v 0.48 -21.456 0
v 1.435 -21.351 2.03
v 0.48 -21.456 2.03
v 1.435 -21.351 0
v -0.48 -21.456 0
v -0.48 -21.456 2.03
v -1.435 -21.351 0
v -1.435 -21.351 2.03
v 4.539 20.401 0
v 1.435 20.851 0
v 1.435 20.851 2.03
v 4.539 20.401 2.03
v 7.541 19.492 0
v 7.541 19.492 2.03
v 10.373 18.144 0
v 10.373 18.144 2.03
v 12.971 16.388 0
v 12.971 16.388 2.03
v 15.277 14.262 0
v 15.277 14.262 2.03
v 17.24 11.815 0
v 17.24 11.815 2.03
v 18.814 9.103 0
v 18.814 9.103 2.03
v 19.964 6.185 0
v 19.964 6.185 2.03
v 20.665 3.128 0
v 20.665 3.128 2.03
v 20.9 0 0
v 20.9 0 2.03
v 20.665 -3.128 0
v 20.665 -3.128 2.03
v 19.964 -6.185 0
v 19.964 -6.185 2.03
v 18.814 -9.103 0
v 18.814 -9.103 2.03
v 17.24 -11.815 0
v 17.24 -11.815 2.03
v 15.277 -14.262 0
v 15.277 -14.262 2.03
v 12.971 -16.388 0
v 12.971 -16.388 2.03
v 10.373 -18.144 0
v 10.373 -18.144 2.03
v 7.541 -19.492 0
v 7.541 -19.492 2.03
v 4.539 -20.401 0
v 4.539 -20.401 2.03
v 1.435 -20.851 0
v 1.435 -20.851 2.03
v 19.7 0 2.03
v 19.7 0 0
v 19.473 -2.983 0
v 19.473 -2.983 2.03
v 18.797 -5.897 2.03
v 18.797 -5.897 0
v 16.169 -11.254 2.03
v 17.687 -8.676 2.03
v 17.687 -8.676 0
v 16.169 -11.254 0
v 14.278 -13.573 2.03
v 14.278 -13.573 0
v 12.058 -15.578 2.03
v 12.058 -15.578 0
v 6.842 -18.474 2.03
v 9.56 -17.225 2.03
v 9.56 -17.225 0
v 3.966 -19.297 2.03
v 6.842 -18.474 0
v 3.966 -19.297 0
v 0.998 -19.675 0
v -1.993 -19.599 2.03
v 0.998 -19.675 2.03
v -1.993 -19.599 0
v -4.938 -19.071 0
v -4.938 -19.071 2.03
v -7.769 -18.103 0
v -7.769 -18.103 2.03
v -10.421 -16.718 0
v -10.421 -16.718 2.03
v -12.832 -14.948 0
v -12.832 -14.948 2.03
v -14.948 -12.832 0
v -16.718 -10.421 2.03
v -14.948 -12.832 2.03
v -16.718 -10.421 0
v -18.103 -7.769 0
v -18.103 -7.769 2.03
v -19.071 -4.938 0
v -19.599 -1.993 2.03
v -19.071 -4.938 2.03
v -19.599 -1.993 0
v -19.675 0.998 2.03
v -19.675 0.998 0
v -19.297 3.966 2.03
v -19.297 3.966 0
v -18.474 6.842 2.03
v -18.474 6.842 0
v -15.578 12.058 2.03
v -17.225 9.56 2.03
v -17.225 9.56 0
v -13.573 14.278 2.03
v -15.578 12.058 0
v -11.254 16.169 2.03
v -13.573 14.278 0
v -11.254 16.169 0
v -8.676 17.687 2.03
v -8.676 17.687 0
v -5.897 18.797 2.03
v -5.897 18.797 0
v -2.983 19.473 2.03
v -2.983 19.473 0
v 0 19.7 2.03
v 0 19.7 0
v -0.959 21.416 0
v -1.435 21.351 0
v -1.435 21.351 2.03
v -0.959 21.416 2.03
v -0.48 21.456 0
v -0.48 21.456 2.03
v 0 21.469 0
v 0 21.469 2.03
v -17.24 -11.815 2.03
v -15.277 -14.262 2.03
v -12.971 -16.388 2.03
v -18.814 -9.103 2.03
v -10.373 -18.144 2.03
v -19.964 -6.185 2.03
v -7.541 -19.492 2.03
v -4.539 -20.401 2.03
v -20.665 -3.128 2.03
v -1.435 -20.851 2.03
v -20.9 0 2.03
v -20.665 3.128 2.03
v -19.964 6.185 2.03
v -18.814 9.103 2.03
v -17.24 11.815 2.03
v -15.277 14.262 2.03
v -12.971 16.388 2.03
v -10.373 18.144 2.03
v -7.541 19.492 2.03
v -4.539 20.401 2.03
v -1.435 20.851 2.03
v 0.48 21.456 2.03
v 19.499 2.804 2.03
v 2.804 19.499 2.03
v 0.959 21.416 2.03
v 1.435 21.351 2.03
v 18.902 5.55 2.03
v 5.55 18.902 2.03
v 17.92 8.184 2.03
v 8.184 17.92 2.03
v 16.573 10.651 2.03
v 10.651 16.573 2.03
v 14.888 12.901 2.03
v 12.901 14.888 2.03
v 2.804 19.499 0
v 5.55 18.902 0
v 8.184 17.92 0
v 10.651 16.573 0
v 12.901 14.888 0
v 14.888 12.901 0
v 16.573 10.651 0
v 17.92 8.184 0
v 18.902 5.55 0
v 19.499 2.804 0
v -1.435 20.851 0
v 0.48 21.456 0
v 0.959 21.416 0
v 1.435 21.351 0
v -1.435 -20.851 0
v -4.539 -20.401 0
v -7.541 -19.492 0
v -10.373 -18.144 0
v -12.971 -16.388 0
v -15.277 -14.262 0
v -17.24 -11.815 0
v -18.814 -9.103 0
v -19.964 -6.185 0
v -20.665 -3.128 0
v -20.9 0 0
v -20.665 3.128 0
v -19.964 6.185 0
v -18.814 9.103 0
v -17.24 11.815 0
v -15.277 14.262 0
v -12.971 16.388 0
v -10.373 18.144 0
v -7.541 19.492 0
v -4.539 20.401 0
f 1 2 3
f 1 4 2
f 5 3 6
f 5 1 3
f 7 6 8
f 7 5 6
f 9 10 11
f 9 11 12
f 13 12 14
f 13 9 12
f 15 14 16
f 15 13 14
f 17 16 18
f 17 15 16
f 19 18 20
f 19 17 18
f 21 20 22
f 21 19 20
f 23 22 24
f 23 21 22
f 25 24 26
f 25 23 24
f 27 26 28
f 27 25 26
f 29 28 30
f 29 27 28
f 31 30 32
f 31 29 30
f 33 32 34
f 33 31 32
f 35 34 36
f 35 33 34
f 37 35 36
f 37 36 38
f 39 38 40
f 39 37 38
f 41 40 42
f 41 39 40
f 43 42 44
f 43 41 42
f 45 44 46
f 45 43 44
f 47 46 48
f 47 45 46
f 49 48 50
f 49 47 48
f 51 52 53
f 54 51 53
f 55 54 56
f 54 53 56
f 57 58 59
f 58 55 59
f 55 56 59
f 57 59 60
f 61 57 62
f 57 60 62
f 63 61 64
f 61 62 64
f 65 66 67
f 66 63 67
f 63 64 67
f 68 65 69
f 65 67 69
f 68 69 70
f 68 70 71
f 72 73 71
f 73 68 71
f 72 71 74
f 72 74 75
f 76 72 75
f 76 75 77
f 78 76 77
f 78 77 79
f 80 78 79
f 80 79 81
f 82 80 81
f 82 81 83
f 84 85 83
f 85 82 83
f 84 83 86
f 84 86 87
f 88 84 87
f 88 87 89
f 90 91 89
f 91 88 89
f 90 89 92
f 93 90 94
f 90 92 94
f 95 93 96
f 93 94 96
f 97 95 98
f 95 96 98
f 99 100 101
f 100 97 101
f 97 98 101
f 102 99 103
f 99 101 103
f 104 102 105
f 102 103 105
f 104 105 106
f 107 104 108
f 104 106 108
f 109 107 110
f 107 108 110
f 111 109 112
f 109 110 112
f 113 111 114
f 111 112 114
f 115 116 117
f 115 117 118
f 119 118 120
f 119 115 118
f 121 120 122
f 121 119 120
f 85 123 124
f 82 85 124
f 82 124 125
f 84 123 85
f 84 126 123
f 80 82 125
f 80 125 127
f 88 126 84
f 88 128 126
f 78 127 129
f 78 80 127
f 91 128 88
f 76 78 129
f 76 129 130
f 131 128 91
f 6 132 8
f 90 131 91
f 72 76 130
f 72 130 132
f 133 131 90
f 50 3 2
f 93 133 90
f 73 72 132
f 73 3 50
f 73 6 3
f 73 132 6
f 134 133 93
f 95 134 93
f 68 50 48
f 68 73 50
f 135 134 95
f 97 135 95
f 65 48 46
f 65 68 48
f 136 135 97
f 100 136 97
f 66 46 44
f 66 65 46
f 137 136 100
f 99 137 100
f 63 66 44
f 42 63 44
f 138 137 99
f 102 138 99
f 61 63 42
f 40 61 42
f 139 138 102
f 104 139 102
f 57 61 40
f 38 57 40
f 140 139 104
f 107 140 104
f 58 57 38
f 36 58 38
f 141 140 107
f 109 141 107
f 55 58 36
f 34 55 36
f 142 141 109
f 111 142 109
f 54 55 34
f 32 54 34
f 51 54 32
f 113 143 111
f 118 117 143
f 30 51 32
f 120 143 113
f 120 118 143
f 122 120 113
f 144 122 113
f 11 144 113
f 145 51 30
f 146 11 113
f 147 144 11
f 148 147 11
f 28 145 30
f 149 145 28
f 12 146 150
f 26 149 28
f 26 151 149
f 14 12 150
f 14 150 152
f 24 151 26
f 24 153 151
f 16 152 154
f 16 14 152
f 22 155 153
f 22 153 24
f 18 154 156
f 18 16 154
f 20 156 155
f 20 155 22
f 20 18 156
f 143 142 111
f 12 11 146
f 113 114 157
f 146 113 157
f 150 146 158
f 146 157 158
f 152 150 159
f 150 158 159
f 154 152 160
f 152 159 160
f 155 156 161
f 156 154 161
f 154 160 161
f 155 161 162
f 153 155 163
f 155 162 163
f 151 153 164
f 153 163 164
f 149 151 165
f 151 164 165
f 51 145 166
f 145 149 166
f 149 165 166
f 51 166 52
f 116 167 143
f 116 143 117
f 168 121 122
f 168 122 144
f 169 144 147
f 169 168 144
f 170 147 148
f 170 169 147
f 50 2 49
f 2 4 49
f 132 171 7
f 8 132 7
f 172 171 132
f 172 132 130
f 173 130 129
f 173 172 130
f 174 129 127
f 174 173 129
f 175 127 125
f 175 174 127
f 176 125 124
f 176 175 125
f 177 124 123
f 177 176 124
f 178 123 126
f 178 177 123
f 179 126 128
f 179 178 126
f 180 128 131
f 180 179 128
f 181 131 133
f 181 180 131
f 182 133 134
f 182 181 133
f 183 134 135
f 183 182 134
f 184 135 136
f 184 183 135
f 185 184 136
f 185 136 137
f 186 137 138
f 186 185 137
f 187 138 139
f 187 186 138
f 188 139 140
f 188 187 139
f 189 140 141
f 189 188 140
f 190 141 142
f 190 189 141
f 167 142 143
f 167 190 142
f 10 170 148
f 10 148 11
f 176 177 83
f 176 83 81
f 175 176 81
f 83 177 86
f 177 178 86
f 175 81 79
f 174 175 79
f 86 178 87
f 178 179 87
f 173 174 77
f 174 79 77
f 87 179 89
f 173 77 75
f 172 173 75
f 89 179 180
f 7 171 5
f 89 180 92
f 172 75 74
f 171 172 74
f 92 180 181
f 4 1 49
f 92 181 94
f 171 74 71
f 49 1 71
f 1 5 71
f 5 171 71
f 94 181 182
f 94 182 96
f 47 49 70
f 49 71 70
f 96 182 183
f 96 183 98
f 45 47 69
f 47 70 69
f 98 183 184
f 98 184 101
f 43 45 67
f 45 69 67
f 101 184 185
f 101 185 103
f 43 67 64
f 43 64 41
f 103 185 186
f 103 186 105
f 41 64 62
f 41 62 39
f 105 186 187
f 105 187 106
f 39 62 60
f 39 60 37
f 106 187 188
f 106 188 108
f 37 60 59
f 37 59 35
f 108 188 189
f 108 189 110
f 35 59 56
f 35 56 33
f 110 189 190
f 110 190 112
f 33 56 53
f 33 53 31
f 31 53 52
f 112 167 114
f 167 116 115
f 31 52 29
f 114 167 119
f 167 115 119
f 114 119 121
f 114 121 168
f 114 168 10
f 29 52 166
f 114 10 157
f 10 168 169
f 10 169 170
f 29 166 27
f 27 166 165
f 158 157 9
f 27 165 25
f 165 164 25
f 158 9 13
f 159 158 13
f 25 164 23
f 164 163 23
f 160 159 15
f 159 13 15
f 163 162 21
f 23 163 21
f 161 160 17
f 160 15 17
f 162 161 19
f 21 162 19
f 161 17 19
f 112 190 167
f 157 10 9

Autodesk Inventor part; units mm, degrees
ref_plane "YZ Plane" through (0, 0, 0) normal (1, 0, 0) x (0, 1, 0)
ref_plane "XZ Plane" through (0, 0, 0) normal (0, 1, 0) x (-1, 0, 0)
ref_plane "XY Plane" through (0, 0, 0) normal (0, 0, 1) x (1, 0, 0)
sketch "Sketch1" plane through (0, 0, 0) normal (0, 0, 1) x (1, 0, 0)
  circle A0 centre (0, 0) radius 19.7
  line L0 (-1.435, 20.8507) -> (-1.435, 21.3507)
  line L1 (1.435, 21.3507) -> (1.435, 20.8507)
  arc A1 (1.435, 21.3507) -> (-1.435, 21.3507) centre (0, 12.6834) ccw
  line L2 (-5.669, 0) -> (4.2057, 0)
  line L3 (0, 24.0978) -> (0, 18.8809)
  line L4 (-1.435, -20.8507) -> (-1.435, -21.3507)
  line L5 (1.435, -21.3507) -> (1.435, -20.8507)
  arc A2 (-1.435, -21.3507) -> (1.435, -21.3507) centre (0, -12.6834) ccw
  arc A3 (-1.435, 20.8507) -> (-1.435, -20.8507) centre (0, 0) ccw
  arc A4 (1.435, -20.8507) -> (1.435, 20.8507) centre (0, 0) ccw
  dimension "d2" = 0.5
  dimension "d3" = 0.5
  dimension "d4" = 2.87
extrude "Extrusion1" add sketch "Sketch1" along normal blind 2.03
properties part number "venti-valve-lock-ring"
